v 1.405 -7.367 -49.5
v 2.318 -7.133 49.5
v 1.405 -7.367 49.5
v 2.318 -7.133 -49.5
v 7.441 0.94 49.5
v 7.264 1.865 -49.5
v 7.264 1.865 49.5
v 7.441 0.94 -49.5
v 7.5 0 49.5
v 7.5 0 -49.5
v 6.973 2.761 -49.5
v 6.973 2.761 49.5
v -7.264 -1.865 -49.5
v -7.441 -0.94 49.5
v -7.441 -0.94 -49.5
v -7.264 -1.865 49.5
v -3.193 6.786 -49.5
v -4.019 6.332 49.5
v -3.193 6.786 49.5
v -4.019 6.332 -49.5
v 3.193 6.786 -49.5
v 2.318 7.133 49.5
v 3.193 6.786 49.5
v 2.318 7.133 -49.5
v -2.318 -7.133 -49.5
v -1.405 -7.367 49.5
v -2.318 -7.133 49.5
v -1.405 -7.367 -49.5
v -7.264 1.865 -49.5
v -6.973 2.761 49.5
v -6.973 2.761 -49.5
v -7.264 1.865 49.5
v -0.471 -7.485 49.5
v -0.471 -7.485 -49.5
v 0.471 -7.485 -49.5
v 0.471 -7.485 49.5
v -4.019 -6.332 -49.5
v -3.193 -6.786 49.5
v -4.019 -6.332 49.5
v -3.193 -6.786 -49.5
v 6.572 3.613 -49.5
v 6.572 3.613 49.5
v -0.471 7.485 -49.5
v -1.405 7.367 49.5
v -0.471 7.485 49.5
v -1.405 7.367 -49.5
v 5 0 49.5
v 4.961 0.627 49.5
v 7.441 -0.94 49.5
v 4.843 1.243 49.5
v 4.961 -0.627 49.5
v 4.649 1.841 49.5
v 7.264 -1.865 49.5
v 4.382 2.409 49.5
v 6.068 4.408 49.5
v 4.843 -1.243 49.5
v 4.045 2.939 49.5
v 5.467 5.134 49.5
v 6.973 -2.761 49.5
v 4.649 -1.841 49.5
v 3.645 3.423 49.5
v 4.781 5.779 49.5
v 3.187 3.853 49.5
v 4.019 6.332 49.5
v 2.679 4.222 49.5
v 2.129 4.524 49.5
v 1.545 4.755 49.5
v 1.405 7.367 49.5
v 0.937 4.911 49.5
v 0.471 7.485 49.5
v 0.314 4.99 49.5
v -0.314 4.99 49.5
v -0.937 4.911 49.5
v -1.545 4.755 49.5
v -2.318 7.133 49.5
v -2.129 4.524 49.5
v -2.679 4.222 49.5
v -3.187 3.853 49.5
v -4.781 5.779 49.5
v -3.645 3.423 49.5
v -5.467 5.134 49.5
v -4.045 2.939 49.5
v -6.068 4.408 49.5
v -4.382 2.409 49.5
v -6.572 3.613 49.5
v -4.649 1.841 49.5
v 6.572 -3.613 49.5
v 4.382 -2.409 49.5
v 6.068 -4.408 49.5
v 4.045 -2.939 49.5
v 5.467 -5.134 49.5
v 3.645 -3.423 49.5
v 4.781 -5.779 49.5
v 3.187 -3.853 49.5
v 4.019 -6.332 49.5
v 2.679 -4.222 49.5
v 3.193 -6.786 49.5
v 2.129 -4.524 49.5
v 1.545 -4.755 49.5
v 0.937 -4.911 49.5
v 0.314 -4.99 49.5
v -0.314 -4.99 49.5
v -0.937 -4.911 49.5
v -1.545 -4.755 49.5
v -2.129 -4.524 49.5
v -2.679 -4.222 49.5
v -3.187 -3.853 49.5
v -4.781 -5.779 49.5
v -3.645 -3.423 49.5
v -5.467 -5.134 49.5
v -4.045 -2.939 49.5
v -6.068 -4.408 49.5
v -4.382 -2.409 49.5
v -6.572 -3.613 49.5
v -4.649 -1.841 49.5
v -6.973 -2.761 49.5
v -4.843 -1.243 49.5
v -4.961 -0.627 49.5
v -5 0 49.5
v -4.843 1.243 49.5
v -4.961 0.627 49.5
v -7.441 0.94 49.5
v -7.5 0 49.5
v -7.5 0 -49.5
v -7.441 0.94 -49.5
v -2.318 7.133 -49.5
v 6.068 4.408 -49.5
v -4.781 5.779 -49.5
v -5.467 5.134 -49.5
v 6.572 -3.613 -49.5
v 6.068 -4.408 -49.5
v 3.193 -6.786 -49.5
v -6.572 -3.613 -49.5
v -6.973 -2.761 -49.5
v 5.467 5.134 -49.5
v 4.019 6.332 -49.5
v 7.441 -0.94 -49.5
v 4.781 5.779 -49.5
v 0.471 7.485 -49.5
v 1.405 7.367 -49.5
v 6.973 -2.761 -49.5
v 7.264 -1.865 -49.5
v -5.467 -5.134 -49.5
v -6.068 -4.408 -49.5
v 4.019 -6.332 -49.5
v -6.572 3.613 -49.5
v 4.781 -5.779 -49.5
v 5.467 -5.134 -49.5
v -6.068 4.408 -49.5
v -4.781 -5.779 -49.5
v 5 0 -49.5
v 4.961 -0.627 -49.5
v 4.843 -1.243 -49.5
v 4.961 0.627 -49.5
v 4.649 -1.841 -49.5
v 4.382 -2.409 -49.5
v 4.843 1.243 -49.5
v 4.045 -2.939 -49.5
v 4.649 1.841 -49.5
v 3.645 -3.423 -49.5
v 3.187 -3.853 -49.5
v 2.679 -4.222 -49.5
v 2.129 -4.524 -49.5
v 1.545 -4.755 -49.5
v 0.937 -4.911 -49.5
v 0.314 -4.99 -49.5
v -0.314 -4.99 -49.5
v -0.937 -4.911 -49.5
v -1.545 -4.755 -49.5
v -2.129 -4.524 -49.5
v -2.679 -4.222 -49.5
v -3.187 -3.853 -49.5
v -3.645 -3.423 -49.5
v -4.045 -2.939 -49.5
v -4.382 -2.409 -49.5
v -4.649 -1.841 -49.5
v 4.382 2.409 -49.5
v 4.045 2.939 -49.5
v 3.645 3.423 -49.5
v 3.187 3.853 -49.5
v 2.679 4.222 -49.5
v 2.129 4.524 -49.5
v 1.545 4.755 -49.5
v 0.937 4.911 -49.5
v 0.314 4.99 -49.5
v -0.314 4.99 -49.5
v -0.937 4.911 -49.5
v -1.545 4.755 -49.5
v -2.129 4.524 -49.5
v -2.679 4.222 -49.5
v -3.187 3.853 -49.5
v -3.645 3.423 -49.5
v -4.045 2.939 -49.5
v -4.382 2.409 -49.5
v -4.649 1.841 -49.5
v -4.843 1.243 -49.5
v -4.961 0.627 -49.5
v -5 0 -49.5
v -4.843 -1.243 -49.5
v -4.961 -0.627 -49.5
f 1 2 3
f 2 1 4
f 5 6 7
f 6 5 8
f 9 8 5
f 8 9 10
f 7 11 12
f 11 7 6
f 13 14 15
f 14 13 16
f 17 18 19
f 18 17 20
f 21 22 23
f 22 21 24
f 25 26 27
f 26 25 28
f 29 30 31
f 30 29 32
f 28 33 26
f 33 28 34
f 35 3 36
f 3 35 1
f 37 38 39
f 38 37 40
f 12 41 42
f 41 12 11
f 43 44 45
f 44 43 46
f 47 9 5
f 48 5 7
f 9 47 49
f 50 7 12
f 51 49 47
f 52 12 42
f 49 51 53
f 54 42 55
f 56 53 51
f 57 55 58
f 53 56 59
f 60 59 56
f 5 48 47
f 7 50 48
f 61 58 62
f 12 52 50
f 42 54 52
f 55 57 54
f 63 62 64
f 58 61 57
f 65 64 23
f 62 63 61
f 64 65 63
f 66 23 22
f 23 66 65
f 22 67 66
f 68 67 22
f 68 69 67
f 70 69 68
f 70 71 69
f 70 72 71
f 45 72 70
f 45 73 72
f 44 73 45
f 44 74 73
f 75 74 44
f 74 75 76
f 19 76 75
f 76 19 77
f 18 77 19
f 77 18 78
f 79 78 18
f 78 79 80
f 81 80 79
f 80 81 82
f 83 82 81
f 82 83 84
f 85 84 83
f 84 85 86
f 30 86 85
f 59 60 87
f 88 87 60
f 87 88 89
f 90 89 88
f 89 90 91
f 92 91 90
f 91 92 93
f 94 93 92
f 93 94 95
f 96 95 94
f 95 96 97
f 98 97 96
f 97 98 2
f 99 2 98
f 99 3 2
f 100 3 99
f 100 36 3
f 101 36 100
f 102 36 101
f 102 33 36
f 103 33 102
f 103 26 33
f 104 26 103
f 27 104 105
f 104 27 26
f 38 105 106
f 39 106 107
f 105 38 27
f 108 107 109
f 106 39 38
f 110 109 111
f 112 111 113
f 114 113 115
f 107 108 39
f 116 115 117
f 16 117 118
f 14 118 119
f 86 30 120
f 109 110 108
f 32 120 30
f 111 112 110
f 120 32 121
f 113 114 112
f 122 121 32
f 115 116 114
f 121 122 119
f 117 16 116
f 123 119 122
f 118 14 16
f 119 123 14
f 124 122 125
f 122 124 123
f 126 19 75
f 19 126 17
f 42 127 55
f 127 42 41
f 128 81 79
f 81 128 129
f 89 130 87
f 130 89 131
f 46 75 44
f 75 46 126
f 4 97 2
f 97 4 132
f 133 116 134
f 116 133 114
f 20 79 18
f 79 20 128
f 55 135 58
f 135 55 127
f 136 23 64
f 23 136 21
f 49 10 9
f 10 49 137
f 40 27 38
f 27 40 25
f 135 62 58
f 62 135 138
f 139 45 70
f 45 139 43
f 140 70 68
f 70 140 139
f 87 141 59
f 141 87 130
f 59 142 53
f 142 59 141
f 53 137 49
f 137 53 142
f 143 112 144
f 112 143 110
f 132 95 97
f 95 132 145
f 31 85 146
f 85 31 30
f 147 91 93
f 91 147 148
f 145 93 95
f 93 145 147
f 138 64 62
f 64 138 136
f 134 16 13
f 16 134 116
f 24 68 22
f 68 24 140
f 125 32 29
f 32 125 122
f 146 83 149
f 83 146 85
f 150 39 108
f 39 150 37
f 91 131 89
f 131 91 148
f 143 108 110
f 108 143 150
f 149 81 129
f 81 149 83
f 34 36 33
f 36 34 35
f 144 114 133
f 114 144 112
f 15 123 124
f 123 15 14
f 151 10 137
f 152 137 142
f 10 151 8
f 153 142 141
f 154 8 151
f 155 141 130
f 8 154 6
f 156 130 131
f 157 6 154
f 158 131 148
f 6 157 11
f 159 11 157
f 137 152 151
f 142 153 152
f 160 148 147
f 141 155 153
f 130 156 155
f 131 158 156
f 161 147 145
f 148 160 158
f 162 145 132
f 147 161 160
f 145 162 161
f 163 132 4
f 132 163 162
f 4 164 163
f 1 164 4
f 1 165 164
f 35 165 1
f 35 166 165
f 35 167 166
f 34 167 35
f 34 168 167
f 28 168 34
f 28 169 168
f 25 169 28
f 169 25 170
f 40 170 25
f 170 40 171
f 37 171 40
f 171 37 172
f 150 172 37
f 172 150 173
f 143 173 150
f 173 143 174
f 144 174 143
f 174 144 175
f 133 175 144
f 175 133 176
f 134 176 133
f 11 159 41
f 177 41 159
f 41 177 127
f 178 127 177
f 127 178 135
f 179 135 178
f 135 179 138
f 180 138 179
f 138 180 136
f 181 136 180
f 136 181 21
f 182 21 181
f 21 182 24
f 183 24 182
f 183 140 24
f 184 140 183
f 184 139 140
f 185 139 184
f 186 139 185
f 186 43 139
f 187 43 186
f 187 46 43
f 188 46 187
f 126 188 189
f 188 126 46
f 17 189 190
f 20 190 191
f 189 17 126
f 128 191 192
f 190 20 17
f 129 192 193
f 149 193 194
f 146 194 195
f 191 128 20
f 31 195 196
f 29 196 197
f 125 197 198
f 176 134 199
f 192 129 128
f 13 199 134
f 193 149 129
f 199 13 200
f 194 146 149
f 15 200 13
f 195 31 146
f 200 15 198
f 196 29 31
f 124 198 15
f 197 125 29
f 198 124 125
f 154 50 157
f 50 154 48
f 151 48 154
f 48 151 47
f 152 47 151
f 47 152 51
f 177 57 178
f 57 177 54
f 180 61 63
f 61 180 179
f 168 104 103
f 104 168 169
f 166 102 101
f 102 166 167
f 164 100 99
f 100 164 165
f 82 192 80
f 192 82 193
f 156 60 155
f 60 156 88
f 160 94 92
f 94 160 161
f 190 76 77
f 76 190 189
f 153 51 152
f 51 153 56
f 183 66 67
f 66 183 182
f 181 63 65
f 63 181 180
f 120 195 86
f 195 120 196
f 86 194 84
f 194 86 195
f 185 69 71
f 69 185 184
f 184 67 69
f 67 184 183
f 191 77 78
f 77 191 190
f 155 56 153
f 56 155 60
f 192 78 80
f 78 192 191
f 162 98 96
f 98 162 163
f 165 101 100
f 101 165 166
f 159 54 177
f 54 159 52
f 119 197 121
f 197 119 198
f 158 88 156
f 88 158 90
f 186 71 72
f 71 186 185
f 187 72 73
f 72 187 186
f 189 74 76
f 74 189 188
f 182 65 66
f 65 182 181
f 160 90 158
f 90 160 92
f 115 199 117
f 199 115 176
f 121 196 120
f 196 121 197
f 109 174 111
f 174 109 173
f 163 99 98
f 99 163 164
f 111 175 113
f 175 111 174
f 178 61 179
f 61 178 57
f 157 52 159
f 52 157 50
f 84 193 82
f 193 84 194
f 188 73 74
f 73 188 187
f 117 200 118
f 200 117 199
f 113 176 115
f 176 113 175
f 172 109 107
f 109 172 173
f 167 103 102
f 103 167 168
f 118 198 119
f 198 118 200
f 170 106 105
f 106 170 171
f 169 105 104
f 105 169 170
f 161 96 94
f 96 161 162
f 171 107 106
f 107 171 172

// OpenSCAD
$fn = 50;


difference() {
	union() {
		translate(v = [0, 0, -49.5000000000]) {
			cylinder(h = 99, r = 7.5000000000);
		}
	}
	union() {
		translate(v = [0, 0, -100.0000000000]) {
			cylinder(h = 200, r = 5.0000000000);
		}
	}
}
